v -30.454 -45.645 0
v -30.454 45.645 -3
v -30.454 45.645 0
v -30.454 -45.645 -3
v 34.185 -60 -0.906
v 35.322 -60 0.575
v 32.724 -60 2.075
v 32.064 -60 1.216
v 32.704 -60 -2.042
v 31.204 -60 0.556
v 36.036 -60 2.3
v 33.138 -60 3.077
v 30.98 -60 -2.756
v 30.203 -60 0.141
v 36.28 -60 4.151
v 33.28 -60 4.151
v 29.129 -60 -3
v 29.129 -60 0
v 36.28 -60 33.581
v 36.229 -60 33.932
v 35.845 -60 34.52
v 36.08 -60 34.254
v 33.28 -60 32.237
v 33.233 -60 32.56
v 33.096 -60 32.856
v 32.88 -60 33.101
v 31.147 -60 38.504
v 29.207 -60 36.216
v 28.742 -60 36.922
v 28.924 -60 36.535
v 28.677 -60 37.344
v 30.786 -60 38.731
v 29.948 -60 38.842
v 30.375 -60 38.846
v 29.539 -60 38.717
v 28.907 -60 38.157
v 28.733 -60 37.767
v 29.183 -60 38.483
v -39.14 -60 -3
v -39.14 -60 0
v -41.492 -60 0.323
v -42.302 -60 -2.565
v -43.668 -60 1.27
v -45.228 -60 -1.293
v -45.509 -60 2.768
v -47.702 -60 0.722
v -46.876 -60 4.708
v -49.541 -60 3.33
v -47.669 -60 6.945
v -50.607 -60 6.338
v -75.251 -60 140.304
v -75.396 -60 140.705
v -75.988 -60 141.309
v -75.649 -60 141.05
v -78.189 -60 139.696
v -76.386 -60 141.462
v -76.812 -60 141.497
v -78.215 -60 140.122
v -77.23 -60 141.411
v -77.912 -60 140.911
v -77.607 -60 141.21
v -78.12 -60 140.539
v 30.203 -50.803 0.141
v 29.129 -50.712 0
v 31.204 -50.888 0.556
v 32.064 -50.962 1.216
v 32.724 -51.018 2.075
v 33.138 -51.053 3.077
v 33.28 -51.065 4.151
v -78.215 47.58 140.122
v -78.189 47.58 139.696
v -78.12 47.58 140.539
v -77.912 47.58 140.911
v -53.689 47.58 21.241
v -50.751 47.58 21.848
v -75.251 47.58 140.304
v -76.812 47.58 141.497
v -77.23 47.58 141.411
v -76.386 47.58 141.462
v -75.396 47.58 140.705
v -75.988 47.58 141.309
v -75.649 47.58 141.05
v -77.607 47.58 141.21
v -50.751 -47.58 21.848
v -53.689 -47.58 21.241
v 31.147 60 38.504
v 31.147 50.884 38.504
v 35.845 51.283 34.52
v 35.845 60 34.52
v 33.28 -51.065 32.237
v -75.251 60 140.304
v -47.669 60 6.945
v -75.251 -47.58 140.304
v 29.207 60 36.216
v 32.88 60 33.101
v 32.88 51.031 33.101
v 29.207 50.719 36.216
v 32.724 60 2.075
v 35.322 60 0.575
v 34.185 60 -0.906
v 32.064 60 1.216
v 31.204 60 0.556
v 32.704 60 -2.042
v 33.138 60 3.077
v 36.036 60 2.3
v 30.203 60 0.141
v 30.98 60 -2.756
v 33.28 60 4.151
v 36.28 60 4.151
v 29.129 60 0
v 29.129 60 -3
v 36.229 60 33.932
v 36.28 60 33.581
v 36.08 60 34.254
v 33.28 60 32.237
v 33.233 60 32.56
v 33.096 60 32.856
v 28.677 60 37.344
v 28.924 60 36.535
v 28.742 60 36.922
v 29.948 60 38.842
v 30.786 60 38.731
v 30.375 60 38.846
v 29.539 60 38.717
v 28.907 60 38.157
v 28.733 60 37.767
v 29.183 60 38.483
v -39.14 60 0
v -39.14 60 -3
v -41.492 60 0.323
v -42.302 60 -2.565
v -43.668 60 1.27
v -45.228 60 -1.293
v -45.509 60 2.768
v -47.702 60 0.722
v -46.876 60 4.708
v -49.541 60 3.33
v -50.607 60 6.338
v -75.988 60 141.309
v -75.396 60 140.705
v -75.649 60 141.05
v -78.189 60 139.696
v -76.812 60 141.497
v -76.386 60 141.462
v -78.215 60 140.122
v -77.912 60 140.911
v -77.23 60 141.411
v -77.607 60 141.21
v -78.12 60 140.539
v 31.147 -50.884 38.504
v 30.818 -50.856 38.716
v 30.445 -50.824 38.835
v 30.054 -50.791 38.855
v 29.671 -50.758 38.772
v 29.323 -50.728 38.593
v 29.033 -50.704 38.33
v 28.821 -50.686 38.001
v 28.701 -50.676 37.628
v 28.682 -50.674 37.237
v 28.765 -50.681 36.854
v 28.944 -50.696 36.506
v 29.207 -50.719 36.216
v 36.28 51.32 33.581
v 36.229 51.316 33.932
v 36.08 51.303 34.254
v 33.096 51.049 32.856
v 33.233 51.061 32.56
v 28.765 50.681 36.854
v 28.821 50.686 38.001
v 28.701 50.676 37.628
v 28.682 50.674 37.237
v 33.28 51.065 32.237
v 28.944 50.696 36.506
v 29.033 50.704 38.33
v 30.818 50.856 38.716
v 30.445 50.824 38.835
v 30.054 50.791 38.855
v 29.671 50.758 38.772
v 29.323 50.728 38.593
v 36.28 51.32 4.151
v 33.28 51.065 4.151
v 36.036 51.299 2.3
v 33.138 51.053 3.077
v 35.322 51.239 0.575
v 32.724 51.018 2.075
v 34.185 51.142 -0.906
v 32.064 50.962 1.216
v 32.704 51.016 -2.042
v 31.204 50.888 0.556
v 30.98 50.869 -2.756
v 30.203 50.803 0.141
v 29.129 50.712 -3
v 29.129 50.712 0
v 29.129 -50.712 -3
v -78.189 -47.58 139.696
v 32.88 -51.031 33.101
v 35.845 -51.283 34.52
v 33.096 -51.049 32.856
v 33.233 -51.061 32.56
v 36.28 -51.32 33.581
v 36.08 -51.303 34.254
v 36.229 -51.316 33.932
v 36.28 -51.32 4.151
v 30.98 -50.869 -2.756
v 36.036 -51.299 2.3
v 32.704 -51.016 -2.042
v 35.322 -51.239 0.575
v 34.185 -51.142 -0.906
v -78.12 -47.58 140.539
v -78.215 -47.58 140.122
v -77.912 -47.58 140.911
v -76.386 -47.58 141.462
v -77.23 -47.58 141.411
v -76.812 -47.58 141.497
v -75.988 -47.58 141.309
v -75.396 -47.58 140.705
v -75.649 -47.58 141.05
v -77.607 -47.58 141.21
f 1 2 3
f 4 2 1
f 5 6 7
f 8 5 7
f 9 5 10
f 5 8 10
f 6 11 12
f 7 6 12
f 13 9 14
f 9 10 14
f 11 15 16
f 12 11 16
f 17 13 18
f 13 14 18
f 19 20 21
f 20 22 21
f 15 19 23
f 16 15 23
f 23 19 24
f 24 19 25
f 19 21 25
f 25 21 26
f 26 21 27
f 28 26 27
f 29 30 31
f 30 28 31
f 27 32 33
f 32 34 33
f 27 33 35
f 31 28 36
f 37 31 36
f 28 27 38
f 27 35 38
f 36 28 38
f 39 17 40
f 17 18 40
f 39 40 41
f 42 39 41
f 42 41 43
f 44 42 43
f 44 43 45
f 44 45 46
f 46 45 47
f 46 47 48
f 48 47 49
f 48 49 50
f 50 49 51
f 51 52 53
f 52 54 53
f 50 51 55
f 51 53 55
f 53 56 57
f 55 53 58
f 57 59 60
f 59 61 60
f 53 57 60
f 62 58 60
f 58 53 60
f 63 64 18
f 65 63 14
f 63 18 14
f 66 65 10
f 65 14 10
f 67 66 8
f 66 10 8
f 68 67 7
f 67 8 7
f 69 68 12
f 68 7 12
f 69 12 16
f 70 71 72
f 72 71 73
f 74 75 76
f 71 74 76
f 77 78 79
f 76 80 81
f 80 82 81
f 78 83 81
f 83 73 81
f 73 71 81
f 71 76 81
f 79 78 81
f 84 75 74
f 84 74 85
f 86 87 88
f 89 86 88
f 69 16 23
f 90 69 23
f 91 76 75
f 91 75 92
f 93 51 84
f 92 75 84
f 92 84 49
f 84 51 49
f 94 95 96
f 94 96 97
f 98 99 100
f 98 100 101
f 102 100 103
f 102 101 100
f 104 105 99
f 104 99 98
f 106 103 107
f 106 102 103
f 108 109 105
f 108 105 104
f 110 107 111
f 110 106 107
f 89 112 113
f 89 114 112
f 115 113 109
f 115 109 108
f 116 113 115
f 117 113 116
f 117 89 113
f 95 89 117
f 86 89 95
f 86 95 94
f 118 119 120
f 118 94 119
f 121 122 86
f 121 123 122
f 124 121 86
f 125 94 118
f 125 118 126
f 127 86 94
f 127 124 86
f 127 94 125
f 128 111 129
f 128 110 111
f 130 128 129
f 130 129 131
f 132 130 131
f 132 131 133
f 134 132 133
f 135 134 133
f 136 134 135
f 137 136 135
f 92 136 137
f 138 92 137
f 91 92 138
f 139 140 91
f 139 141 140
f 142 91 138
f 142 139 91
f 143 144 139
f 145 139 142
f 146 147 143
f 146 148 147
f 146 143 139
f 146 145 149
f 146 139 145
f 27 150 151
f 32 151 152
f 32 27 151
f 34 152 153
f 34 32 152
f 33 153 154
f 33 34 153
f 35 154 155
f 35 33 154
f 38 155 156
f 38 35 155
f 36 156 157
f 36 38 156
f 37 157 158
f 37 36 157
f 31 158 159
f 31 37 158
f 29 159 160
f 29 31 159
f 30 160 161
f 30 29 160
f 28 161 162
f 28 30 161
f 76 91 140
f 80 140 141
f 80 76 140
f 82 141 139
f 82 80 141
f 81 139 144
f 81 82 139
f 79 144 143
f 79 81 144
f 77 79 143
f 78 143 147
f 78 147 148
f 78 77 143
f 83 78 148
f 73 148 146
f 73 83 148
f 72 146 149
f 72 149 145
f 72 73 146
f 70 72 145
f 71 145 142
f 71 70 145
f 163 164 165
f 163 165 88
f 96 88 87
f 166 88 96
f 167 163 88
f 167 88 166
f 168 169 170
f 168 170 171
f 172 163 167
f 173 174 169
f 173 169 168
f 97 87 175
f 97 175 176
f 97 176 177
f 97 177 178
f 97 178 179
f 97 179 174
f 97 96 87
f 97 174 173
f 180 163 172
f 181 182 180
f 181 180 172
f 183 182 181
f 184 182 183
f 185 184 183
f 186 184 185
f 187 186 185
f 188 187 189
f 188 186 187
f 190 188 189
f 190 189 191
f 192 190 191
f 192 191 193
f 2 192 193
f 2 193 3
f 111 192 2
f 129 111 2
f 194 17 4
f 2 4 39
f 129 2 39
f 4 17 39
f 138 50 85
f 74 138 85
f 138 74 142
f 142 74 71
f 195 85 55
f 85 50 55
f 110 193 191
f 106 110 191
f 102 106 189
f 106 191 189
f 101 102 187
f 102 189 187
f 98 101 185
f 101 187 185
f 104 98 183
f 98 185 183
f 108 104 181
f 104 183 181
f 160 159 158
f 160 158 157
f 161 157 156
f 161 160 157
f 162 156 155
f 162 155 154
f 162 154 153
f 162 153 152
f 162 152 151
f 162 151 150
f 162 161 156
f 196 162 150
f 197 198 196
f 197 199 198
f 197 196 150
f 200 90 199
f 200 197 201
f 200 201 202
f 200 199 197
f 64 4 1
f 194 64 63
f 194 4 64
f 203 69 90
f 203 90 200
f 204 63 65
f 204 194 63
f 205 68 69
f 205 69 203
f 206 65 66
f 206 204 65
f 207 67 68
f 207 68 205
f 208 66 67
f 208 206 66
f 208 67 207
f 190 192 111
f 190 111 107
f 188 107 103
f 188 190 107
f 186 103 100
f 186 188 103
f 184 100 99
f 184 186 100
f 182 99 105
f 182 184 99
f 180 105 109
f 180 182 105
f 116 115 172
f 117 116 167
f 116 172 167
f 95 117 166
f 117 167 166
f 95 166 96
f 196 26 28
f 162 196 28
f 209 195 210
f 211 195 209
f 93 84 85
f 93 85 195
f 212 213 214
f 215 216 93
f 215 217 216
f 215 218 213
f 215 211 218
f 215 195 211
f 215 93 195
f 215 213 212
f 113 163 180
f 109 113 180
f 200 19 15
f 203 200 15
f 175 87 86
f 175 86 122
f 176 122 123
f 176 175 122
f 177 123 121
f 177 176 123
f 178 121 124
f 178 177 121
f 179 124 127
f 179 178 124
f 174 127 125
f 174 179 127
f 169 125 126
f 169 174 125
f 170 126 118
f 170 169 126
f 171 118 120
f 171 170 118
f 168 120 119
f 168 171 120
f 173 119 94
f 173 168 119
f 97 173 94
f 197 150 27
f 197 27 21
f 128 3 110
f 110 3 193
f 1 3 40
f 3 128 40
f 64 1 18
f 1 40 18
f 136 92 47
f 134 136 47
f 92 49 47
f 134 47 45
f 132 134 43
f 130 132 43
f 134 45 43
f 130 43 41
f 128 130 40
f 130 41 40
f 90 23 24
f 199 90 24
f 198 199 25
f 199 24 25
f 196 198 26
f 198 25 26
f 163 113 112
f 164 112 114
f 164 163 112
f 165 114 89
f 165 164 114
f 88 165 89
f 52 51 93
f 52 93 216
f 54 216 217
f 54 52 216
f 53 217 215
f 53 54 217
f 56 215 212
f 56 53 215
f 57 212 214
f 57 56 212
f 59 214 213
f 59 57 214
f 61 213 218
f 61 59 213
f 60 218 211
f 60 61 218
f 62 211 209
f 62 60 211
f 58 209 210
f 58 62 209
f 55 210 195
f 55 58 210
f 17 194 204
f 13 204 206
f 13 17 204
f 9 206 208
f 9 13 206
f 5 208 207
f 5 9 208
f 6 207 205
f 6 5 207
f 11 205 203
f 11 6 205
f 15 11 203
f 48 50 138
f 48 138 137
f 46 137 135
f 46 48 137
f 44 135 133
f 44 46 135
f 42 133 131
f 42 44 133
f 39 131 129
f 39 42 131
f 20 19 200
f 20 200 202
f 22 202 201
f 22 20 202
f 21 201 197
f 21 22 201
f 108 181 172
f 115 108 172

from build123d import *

# Parameters (mm, degrees)
PAD_DEPTH       = 60
POCKET_DEPTH    = 146.501
SKETCH002_W     = 132.291259
SKETCH002_H     = 95.159112
POCKET001_DEPTH = 5


with BuildPart() as part:
    # Sketch → Pad (new body, symmetric)
    with BuildSketch(Plane.XZ):
        with BuildLine():
            Line((-75.251187, 140.30381), (-47.669047, 6.945158))
            ThreePointArc((-47.669047, 6.945158), (-44.639819, 1.955924), (-39.140452, 0))
            Line((-39.140452, 0), (29.128963, 0))
            ThreePointArc((29.128963, 0), (32.06412, 1.215782), (33.279902, 4.150939))
            Line((33.279902, 4.150939), (33.279902, 32.237305))
            ThreePointArc((33.279902, 32.237305), (33.175099, 32.712971), (32.880098, 33.100547))
            Line((32.880098, 33.100547), (29.206815, 36.21552))
            ThreePointArc((31.147112, 38.503586), (29.032931, 38.329702), (29.206815, 36.21552))
            Line((31.147112, 38.503586), (35.845014, 34.519728))
            ThreePointArc((36.279902, 33.580735), (36.165902, 34.098141), (35.845014, 34.519728))
            Line((36.279902, 33.580735), (36.279902, 4.150939))
            ThreePointArc((29.128963, -3), (34.18544, -0.905538), (36.279902, 4.150939))
            Line((29.128963, -3), (-39.140452, -3))
            ThreePointArc((-50.606869, 6.337538), (-46.534171, -0.370324), (-39.140452, -3))
            Line((-50.606869, 6.337538), (-78.189009, 139.69619))
            ThreePointArc((-75.251187, 140.30381), (-77.023908, 141.468911), (-78.189009, 139.69619))
        make_face()
    extrude(amount=PAD_DEPTH, both=True)

    # Sketch001 → Pocket (cut, through all)
    with BuildSketch(Plane.XY.offset(-5)):
        Polygon((-30.454193, 45.645451), (-30.454193, -45.645451), (48.285122, -52.340881), (48.285122, 52.340881), align=None)
    extrude(amount=POCKET_DEPTH, mode=Mode.SUBTRACT)

    # Sketch002 (on Face7 of Pocket) → Pocket001 (cut)
    with BuildSketch(Plane(origin=(-44.336026, 0, -9.169877), x_dir=(-0.20254, 0, 0.979274), z_dir=(0.979274, 0, 0.20254))):
        with Locations((97.820296, 0)):
            Rectangle(SKETCH002_W, SKETCH002_H)
    extrude(amount=-POCKET001_DEPTH, mode=Mode.SUBTRACT)


solid = part.part
